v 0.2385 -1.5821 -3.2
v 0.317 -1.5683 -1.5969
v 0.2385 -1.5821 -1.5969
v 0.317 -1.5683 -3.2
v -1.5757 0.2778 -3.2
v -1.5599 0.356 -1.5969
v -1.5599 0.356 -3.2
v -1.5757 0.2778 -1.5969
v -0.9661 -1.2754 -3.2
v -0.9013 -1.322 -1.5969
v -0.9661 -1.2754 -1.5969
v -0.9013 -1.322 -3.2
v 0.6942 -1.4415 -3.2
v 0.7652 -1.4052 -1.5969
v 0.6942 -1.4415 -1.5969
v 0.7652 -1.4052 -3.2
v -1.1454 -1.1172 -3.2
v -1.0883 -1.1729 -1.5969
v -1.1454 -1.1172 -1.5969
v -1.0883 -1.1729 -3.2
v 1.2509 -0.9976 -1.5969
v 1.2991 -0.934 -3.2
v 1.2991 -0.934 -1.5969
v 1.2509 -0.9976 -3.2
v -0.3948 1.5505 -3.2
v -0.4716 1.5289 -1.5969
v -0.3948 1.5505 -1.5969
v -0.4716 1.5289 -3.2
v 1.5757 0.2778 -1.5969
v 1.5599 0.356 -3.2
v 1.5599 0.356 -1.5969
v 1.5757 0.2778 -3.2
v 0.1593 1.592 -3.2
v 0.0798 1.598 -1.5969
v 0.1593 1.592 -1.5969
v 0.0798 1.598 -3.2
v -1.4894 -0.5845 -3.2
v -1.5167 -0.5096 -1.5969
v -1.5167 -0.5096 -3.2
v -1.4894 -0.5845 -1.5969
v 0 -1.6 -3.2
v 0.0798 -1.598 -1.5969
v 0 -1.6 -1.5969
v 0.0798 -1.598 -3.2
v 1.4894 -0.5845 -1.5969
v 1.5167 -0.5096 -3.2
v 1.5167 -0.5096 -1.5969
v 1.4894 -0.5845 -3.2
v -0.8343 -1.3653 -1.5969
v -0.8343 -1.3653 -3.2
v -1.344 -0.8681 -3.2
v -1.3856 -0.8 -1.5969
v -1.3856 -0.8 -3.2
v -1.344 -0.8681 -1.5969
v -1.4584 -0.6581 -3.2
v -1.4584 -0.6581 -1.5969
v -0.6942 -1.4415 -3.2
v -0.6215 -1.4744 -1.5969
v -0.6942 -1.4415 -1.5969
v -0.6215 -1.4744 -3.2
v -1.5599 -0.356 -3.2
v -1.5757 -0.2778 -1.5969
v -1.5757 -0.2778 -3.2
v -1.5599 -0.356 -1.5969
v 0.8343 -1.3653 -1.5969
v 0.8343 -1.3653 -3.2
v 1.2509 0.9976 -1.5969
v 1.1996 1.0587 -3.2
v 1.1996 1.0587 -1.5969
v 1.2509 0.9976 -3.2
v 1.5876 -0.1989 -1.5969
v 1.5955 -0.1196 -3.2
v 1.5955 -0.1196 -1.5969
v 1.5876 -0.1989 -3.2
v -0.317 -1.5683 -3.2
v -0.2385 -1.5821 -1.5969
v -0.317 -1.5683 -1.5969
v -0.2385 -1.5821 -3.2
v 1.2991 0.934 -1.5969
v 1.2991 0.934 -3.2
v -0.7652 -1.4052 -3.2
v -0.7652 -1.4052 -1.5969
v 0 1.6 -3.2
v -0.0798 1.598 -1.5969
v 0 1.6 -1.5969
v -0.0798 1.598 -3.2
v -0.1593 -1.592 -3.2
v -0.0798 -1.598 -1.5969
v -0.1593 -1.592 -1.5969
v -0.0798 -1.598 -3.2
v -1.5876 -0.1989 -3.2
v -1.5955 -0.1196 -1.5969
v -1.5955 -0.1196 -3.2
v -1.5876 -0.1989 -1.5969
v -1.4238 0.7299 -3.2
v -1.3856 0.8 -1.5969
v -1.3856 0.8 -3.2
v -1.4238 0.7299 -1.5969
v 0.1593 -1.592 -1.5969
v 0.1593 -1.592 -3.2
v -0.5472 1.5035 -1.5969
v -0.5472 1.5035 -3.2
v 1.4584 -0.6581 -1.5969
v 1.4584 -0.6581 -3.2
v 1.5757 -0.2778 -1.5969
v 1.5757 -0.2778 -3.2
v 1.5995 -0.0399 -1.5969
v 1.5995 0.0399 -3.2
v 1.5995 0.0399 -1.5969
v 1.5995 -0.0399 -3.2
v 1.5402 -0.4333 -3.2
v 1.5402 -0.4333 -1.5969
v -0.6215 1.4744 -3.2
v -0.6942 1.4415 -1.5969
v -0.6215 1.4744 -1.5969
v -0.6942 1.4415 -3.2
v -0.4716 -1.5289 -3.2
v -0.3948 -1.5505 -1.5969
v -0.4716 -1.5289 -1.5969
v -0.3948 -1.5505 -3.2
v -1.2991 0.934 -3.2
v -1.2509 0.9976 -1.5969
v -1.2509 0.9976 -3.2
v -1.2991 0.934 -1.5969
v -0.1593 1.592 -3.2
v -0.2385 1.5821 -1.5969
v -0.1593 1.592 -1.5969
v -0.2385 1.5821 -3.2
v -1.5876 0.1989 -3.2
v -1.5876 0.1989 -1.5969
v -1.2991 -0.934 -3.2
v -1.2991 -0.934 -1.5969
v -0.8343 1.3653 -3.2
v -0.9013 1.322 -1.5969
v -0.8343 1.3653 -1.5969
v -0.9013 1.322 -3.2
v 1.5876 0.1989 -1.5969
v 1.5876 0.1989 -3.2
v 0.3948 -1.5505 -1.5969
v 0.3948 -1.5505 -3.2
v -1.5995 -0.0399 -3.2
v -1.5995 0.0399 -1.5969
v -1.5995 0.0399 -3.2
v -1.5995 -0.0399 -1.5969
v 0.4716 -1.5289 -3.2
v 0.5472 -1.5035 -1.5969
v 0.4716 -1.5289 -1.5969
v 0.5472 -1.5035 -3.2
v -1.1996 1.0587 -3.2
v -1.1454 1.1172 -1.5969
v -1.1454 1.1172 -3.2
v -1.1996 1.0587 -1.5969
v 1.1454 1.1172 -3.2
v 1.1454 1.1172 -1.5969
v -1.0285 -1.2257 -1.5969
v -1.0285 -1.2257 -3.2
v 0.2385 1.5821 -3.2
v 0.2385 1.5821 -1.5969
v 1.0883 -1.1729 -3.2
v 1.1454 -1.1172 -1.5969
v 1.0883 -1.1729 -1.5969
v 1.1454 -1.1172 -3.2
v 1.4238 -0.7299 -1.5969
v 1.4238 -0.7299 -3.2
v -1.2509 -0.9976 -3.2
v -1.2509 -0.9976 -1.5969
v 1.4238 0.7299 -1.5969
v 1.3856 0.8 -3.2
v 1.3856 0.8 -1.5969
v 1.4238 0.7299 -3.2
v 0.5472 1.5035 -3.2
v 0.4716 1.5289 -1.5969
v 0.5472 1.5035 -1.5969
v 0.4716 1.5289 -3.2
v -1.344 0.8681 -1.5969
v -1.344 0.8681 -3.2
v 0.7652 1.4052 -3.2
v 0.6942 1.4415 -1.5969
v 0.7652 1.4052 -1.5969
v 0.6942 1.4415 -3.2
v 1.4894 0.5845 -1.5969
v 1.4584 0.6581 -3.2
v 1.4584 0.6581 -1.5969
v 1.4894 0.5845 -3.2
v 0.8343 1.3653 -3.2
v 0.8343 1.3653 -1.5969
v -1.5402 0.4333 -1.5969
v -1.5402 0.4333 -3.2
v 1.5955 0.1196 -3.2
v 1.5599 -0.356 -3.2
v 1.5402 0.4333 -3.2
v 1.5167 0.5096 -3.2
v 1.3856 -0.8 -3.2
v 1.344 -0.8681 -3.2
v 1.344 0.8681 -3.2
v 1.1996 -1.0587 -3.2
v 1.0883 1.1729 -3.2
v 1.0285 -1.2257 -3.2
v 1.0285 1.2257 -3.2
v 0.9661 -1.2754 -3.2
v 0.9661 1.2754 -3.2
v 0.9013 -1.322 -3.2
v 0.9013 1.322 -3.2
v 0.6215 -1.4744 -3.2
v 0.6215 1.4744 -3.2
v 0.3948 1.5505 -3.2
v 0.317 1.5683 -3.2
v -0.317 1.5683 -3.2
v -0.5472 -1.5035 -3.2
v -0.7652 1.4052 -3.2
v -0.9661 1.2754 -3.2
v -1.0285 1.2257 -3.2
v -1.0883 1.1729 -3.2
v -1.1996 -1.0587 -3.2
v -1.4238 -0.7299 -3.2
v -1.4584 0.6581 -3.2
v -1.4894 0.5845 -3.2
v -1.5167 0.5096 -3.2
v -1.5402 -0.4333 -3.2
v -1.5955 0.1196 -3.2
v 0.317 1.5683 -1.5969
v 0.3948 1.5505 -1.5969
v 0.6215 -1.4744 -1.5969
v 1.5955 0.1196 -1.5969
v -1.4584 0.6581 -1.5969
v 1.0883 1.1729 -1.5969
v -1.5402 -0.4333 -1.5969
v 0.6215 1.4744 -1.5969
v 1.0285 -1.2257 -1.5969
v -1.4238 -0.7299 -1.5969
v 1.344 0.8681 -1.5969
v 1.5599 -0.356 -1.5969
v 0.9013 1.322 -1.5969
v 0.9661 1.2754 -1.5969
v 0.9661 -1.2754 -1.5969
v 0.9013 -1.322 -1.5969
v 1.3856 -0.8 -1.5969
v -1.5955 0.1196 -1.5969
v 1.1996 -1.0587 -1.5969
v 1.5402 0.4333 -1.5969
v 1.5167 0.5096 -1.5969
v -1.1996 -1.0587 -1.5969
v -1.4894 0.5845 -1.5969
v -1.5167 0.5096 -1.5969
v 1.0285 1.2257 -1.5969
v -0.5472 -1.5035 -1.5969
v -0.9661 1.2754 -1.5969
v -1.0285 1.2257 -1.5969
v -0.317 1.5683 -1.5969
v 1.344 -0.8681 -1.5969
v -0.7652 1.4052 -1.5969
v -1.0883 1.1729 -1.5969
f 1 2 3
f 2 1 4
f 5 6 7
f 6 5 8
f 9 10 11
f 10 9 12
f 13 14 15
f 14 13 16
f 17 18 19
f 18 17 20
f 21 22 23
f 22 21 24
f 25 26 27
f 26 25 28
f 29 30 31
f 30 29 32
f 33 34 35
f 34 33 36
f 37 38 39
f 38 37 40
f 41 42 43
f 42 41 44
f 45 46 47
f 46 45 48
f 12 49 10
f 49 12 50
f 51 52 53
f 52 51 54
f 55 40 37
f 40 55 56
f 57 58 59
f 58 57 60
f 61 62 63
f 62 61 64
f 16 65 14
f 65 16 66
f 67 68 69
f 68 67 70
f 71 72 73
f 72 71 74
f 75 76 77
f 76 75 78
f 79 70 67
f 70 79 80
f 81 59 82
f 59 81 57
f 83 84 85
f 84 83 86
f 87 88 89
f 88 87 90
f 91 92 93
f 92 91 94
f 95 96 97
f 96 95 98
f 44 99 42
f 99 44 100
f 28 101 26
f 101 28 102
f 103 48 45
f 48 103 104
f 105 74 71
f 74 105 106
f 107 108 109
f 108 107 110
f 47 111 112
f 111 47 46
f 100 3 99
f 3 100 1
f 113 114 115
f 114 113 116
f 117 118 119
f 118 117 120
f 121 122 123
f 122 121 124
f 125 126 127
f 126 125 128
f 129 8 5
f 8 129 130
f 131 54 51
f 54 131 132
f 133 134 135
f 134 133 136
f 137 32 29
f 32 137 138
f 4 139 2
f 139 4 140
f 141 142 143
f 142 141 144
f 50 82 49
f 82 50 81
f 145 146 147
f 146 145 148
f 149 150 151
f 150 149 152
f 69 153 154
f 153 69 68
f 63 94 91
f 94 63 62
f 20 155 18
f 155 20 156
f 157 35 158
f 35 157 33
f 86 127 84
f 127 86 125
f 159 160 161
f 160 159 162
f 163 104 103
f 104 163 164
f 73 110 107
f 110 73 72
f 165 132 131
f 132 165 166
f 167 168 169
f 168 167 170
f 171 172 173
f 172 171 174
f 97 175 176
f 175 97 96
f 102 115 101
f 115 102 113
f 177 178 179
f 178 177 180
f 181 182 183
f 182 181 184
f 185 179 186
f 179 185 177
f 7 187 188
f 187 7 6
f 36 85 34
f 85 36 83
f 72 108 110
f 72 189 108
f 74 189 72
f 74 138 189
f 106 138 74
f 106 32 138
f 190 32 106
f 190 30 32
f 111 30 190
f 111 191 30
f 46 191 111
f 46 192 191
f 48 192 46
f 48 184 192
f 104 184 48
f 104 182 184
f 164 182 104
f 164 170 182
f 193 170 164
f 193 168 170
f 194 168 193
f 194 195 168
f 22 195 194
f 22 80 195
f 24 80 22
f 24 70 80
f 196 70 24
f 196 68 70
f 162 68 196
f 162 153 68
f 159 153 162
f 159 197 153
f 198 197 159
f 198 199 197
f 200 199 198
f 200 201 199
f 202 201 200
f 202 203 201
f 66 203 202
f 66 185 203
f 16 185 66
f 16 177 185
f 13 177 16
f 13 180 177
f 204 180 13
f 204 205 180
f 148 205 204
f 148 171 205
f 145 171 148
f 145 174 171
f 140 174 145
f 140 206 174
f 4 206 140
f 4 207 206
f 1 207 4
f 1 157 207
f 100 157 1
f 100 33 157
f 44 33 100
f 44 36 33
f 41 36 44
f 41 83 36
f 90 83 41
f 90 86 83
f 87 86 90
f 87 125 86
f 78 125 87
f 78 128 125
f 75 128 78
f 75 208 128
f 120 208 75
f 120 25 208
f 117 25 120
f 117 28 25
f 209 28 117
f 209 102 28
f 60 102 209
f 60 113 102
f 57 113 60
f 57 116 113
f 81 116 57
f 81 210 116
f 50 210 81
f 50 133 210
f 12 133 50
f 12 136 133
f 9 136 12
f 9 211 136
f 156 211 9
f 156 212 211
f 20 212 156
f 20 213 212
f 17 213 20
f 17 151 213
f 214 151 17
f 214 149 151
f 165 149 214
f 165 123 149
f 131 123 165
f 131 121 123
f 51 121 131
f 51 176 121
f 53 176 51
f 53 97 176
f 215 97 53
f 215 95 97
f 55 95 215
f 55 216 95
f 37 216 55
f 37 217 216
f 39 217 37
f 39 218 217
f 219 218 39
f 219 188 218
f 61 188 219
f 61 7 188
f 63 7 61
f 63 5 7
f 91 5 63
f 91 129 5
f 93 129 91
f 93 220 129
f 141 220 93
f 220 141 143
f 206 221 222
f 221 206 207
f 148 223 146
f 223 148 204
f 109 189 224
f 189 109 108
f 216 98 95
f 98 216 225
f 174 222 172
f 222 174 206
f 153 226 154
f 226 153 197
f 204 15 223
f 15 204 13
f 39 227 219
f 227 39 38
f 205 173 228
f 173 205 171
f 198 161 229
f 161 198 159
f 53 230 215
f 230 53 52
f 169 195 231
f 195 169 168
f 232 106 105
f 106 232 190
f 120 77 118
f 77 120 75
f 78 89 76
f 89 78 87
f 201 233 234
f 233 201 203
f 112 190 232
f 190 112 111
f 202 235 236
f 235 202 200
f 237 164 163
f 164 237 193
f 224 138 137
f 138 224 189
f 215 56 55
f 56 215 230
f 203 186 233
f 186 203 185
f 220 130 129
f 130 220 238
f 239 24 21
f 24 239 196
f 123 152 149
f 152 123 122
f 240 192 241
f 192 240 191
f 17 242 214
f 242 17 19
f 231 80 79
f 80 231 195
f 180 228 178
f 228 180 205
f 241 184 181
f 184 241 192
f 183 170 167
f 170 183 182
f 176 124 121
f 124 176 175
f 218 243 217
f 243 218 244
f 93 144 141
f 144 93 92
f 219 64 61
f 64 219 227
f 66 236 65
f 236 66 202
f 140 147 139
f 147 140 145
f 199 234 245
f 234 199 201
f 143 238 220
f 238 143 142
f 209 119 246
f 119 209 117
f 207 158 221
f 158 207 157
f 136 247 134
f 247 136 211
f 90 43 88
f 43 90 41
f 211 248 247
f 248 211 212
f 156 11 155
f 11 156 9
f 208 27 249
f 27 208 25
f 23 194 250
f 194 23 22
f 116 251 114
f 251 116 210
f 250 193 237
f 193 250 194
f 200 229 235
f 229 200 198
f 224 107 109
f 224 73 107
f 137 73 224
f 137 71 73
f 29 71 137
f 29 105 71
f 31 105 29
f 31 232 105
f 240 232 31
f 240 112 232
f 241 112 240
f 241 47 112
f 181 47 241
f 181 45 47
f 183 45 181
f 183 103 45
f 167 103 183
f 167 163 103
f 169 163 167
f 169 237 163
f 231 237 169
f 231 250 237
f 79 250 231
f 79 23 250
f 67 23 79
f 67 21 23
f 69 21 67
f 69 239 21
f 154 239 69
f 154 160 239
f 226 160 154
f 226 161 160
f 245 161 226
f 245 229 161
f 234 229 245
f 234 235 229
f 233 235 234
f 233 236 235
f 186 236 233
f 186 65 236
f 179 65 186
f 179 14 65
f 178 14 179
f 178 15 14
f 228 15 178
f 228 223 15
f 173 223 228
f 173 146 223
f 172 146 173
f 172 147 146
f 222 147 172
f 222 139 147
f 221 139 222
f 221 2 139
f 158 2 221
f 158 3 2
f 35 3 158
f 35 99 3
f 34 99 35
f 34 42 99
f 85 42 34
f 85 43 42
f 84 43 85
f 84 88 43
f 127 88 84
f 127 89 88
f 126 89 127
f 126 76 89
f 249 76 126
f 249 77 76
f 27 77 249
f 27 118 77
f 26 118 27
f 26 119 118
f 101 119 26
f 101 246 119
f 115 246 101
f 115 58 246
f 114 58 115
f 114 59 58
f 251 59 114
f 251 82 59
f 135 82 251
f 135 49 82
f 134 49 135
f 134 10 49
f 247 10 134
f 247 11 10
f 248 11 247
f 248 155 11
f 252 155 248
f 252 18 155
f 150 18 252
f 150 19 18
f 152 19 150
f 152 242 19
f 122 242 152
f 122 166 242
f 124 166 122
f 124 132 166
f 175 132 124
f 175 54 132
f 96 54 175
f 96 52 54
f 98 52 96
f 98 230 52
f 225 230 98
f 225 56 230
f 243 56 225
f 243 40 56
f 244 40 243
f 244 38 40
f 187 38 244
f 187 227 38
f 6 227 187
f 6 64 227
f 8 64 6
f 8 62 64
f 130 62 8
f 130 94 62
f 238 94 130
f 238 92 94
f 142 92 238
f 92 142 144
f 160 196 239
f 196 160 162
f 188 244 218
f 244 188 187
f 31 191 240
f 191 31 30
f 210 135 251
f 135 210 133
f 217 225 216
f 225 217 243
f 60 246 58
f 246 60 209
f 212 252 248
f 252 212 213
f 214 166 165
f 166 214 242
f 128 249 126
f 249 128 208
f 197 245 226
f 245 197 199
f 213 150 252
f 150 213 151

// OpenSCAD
use <../lib.scad>
use <814.scad>
use <815c01.scad>
$fa=1; $fs=0.2;
function ldraw_lib__814c01_f2(realsolid=false) = [
// 0 Train Level Crossing Gate Type 1 - Base with White/Red Crossbar Left Open (Complete)
// 0 Name: 814c01-f2.dat
// 0 Author: Steffen [Steffen]
// 0 !LDRAW_ORG Shortcut UPDATE 2017-01
// 0 !LICENSE Licensed under CC BY 2.0 and CC BY 4.0 : see CAreadme.txt
// 
// 0 BFC CERTIFY CCW
  [0,"BFC","CERTIFY"],
  [0,"BFC","CCW"],
// 
// 0 !CMDLINE -c1
// 
// 0 !HISTORY 2017-12-30 [PTadmin] Official Update 2017-01
// 
// 
// 1 16 0 0 0 1 0 0 0 1 0 0 0 1 814.dat
  [1,16,0,0,0,1,0,0,0,1,0,0,0,1, ldraw_lib__814(realsolid)],
// 1 15 0 -28 0 1 0 0 0 0 1 0 -1 0 815c01.dat
  [1,15,0,-28,0,1,0,0,0,0,1,0,-1,0, ldraw_lib__815c01(realsolid)],
];
module ldraw_lib__814c01_f2(step=0, col=false, unit=2/5, alt=false, line=0.2, solid=!$preview)
    makepoly(ldraw_lib__814c01_f2(solid), step=step, col=col, unit=unit, alt=alt, line=line, solid=solid);
ldraw_lib__814c01_f2(line=0.2);
